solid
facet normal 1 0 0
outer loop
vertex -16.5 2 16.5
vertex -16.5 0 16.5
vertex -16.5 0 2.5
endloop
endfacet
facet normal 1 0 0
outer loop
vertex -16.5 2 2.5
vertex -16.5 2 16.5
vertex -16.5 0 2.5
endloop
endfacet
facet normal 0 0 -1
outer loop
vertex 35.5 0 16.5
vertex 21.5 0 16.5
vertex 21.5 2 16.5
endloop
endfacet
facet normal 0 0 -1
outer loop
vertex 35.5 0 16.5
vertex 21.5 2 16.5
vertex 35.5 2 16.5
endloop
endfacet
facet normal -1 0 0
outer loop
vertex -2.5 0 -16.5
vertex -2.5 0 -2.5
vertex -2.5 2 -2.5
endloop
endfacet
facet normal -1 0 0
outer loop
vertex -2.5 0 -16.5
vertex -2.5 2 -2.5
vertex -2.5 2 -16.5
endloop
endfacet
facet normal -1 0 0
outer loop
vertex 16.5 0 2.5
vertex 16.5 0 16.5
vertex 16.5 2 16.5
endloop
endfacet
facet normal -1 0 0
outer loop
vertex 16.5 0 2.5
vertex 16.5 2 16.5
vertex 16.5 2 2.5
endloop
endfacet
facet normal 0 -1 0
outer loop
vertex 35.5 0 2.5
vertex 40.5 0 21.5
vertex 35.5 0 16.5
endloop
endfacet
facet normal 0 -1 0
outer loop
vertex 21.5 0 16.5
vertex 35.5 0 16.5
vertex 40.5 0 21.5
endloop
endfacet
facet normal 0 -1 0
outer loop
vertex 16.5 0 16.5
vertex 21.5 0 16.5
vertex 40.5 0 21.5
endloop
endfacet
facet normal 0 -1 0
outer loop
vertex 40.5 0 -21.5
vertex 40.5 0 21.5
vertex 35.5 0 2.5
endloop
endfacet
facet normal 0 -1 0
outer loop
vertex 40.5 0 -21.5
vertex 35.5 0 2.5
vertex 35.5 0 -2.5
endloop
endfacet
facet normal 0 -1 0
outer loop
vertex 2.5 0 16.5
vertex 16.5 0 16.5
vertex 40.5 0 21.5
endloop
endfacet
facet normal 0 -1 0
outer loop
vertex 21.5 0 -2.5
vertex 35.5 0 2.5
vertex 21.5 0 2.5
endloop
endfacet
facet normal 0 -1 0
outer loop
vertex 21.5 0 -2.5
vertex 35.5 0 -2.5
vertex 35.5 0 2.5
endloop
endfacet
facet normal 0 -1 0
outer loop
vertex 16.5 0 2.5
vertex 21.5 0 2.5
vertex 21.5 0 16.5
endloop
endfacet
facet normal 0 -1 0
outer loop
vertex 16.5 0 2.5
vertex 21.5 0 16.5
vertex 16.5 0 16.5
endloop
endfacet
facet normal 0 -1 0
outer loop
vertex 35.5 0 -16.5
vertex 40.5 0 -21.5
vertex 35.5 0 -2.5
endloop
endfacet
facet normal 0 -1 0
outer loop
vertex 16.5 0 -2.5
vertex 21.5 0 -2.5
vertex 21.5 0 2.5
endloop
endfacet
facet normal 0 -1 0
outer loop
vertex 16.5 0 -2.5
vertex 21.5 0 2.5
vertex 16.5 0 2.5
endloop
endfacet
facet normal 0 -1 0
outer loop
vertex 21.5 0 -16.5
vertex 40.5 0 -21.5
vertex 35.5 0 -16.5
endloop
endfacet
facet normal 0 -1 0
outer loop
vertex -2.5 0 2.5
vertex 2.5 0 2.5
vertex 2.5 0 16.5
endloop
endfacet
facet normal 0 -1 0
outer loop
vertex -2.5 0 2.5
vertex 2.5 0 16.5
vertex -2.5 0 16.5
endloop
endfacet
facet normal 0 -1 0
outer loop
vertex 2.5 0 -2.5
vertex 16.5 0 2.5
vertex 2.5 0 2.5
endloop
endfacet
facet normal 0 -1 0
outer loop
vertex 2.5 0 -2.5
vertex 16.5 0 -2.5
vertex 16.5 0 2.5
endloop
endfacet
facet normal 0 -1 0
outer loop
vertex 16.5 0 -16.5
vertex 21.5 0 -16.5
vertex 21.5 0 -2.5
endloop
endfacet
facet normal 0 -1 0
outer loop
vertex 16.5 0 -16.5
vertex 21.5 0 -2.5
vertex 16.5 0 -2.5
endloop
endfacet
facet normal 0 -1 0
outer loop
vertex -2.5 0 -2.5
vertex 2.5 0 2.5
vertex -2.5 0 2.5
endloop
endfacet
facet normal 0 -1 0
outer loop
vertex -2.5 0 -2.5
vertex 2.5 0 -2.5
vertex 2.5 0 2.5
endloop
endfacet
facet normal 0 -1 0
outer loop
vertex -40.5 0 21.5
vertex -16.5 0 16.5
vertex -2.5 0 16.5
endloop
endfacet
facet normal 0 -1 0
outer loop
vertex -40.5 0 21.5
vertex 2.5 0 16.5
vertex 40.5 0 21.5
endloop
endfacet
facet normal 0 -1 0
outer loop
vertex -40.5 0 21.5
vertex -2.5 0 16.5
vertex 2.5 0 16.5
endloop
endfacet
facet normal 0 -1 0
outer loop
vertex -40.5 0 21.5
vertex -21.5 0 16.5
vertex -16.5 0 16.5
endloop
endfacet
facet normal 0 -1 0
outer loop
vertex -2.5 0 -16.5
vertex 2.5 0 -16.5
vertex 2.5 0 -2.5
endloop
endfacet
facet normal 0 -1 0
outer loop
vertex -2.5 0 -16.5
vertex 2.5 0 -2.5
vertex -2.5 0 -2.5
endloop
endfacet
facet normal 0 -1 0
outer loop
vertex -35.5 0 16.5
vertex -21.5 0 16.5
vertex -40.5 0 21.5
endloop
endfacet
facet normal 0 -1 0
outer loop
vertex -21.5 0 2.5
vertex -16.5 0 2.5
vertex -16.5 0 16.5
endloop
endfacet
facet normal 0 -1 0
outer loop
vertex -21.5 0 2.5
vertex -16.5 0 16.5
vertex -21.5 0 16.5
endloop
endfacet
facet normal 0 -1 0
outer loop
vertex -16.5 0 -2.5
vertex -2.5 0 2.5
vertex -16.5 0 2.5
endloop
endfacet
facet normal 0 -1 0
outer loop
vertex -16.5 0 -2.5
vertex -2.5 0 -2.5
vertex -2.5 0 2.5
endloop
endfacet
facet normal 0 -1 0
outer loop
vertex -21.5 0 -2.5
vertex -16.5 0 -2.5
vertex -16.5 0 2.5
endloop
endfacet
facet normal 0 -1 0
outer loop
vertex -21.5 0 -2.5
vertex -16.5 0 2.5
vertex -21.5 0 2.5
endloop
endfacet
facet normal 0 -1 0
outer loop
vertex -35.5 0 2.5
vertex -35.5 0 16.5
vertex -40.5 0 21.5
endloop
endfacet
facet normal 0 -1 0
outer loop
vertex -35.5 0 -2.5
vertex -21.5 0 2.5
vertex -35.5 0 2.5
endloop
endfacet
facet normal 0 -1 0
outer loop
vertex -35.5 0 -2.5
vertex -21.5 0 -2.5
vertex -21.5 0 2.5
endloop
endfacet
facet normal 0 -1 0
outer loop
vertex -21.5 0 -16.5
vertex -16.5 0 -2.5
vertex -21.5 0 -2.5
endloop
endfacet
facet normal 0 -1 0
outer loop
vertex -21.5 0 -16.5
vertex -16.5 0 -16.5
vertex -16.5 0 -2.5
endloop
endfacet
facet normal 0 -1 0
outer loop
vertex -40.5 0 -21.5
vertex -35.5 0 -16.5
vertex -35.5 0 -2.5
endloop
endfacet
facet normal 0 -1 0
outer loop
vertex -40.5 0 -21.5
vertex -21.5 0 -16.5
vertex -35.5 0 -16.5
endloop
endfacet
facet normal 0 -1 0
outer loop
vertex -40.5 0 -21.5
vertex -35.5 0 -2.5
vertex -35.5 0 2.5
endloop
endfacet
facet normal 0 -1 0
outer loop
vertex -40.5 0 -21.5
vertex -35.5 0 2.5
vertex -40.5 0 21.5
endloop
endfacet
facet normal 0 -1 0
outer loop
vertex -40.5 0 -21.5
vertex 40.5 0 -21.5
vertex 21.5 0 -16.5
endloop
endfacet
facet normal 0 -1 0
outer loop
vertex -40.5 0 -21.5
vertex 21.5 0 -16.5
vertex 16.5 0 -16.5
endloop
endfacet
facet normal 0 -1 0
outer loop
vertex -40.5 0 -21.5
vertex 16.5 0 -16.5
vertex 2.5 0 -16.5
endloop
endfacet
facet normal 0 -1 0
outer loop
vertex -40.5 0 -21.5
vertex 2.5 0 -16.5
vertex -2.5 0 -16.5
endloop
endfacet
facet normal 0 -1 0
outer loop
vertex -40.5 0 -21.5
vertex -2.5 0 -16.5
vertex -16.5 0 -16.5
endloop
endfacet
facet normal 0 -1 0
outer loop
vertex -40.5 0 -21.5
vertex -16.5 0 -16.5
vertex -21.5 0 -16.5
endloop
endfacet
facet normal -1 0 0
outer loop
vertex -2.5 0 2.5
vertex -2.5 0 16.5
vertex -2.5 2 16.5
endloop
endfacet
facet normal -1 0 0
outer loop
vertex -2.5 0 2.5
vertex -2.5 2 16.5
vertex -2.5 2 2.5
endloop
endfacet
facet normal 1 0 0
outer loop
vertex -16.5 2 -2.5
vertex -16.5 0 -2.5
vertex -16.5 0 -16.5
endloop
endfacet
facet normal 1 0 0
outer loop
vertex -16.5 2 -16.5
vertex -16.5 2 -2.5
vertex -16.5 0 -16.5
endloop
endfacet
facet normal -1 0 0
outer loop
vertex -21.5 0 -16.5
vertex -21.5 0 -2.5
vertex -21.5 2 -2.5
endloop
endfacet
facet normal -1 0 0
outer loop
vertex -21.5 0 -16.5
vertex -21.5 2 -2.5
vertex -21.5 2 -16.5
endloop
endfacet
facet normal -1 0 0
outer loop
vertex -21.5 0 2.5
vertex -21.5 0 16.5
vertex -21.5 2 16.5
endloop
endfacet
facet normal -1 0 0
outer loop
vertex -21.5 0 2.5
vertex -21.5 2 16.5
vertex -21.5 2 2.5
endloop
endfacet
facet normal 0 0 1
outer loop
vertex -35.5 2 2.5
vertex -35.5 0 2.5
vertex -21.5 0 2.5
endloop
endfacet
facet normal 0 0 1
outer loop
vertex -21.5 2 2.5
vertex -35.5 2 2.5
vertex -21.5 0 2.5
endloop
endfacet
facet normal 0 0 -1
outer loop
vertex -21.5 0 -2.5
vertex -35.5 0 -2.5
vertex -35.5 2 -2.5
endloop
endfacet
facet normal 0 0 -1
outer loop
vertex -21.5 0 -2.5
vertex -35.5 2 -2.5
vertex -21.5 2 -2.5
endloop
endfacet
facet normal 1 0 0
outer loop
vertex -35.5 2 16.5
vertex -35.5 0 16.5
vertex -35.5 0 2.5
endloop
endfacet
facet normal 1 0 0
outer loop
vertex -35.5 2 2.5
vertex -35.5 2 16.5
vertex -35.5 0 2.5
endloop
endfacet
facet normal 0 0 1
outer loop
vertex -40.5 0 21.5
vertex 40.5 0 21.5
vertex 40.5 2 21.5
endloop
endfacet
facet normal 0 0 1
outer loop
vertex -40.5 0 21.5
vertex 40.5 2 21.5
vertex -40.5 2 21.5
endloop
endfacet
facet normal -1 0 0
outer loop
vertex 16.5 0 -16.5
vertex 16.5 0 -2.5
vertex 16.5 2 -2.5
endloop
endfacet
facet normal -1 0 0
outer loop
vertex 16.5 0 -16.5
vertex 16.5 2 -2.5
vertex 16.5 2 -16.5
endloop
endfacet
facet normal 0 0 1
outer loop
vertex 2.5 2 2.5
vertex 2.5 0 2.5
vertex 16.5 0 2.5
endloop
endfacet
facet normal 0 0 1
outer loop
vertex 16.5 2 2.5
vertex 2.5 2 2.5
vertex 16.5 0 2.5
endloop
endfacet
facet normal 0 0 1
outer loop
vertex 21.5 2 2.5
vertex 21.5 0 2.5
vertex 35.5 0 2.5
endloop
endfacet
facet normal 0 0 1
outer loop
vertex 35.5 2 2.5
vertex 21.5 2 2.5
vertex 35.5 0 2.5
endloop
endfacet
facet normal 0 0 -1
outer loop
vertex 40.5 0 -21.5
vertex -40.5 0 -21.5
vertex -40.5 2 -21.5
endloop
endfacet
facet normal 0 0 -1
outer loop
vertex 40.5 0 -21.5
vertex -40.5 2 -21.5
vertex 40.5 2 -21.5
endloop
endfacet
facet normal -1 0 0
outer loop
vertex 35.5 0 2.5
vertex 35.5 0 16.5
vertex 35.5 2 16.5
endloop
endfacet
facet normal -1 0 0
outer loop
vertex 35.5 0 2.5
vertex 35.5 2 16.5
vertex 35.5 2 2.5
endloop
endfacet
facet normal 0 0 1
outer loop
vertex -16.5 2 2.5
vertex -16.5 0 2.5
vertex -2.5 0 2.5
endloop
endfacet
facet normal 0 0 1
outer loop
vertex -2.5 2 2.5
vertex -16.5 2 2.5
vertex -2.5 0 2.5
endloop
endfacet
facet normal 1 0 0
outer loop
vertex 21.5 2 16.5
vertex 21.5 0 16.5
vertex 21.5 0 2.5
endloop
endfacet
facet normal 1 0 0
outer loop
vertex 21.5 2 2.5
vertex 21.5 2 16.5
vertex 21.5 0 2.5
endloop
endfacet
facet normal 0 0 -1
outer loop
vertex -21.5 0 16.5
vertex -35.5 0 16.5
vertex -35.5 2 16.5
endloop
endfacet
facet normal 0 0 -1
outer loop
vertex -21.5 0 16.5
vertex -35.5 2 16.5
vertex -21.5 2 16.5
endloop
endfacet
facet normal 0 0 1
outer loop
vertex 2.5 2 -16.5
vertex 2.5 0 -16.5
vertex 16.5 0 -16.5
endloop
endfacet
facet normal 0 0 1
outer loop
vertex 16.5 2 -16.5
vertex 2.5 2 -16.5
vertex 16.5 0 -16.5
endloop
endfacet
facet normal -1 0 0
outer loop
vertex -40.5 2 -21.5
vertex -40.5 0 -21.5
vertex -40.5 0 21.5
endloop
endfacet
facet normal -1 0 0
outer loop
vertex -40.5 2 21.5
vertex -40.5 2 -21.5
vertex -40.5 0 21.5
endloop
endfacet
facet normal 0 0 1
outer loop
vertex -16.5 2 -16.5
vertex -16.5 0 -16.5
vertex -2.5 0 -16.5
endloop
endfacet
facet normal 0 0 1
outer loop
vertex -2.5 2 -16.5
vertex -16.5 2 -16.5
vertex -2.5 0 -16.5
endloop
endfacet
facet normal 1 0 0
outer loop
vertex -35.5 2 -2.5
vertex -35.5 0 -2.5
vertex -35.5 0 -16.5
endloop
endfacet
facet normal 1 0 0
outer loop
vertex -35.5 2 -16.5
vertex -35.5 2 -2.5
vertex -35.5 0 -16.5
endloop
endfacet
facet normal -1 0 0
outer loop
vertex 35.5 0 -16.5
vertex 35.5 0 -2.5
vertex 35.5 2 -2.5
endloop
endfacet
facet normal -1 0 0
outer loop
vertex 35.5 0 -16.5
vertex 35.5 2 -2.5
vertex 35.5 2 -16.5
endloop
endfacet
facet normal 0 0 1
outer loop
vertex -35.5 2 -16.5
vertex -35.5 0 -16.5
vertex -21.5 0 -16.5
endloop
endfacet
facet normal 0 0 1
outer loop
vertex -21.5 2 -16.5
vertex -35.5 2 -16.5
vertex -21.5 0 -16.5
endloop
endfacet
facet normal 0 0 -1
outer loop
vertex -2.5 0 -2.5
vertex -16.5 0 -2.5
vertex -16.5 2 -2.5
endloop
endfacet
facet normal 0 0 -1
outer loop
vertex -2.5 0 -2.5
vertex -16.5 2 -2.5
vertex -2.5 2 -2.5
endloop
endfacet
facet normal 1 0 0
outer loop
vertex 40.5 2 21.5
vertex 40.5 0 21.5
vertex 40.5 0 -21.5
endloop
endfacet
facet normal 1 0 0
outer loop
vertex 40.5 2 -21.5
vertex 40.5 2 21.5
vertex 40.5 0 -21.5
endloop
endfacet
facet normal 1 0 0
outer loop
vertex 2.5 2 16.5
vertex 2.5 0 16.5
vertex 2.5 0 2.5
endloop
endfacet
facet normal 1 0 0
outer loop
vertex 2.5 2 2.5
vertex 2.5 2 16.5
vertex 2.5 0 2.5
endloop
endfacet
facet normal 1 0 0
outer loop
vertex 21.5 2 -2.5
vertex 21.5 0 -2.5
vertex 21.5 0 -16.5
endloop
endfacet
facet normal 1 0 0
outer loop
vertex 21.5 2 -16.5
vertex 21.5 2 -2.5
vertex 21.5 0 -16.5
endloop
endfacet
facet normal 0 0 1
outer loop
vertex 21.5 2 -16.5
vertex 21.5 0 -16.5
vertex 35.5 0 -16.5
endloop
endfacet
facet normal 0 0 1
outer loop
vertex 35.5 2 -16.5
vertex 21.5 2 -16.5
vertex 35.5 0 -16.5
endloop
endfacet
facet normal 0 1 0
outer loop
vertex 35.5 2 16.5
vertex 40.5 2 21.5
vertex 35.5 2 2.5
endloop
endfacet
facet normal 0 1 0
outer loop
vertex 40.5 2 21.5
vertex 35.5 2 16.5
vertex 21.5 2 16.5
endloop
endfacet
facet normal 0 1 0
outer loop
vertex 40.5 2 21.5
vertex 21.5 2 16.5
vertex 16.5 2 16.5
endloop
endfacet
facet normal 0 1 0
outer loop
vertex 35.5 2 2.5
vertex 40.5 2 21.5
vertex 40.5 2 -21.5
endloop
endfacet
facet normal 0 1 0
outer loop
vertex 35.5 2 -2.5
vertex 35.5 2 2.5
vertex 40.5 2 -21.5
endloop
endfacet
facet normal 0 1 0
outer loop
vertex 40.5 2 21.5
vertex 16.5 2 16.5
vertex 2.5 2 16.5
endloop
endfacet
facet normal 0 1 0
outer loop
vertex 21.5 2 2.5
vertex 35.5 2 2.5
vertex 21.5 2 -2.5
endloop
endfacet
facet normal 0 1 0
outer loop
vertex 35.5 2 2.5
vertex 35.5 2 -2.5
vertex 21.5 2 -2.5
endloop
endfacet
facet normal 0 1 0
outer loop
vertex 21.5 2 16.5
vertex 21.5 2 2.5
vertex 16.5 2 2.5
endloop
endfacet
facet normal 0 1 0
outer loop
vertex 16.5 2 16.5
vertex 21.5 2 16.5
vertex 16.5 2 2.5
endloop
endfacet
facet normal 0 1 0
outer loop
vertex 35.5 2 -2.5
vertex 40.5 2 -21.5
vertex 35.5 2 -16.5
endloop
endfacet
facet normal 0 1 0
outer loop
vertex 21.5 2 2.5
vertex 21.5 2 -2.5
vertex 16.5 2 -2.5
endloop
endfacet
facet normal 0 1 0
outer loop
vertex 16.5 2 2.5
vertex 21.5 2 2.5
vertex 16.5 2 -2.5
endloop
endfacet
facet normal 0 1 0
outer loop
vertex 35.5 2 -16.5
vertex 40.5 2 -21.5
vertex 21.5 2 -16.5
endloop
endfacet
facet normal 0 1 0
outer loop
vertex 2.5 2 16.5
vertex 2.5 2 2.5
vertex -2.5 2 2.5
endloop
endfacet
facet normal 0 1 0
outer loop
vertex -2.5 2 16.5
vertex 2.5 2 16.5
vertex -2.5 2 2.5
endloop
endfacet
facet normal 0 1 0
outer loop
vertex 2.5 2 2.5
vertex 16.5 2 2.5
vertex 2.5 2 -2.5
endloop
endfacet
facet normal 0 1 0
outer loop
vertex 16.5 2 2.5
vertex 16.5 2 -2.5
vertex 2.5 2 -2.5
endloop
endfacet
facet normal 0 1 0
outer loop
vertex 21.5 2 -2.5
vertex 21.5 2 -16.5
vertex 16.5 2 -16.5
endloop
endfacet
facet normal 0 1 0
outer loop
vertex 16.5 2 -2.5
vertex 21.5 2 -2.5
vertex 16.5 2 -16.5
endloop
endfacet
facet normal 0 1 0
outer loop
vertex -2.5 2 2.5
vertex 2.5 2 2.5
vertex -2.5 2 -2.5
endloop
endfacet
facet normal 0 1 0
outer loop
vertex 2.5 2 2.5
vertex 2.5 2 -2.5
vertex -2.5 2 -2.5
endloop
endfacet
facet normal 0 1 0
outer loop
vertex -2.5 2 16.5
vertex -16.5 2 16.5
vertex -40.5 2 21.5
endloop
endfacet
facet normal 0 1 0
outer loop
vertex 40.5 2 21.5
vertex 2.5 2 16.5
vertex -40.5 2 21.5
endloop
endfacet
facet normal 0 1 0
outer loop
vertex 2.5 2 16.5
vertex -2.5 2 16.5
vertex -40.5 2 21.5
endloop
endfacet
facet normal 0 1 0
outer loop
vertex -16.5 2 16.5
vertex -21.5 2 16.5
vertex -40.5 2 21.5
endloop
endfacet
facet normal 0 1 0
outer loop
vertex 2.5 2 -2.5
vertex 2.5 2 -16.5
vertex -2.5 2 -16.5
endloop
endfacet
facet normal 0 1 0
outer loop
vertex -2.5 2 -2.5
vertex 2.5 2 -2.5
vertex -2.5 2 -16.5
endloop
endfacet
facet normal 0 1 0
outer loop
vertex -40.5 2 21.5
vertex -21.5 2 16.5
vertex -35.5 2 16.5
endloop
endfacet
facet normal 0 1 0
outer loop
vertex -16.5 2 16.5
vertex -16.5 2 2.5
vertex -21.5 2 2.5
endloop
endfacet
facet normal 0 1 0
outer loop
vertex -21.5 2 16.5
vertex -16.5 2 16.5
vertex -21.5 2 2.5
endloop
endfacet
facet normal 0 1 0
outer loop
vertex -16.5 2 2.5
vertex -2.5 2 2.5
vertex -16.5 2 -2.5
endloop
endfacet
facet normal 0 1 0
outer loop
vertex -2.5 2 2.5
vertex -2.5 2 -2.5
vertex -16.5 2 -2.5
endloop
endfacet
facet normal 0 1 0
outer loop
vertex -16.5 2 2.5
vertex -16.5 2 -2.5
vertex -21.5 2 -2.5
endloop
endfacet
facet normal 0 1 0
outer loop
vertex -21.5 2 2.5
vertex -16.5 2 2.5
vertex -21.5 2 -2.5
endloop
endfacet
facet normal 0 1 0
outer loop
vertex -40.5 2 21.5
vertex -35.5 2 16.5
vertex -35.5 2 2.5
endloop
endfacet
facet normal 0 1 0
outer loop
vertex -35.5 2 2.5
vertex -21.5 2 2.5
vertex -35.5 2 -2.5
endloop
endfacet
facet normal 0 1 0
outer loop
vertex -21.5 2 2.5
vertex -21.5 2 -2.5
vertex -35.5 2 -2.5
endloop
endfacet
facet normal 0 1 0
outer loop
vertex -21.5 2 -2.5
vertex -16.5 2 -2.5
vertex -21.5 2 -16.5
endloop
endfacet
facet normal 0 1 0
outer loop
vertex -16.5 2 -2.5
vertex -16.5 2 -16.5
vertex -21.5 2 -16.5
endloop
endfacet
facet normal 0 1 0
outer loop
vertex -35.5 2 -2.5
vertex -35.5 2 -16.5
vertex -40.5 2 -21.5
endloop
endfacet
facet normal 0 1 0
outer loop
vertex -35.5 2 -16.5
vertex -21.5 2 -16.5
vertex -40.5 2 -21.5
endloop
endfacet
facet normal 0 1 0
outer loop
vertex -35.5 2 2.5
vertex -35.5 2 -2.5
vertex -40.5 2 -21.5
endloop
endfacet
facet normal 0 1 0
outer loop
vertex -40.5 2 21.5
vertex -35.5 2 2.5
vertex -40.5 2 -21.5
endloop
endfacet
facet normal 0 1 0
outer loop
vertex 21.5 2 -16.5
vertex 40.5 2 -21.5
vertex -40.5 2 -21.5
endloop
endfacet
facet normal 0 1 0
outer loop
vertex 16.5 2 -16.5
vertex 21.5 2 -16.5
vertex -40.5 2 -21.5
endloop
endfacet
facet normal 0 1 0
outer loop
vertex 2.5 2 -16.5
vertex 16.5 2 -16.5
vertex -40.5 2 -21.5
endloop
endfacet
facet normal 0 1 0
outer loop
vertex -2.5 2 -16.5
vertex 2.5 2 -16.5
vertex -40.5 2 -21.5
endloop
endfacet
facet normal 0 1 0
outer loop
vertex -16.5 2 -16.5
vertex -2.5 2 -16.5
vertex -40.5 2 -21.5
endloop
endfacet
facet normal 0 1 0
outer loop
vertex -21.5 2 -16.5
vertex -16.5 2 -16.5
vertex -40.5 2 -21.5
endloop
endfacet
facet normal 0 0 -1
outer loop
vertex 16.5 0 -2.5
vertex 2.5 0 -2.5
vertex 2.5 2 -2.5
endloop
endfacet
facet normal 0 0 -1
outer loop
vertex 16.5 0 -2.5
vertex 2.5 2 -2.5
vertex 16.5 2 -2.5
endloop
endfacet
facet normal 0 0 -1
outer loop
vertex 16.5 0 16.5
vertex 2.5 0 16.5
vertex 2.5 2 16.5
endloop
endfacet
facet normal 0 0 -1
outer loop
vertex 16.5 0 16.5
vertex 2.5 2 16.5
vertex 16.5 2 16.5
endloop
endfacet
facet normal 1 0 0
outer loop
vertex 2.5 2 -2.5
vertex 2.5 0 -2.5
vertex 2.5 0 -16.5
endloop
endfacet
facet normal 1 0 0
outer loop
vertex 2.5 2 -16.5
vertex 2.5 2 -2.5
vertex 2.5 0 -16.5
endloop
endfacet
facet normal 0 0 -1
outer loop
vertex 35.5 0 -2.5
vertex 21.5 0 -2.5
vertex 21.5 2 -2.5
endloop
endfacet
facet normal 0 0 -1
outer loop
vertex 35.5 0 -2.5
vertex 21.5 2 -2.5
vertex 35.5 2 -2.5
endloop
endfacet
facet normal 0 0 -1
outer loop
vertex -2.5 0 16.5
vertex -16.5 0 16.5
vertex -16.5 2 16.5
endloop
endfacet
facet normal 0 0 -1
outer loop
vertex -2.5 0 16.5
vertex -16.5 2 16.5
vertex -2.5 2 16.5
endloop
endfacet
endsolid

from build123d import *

# Parameters (mm, degrees)
SKETCH1_W           = 14
SKETCH1_H           = 14
BOSS_EXTRUDE1_DEPTH = 2


with BuildPart() as part:
    # Sketch1 → Boss-Extrude1 (new body)
    with BuildSketch(Plane(origin=(0, 0, 0), x_dir=(1, 0, 0), z_dir=(0, 1, 0))):
        Polygon((-40.5, 21.5), (40.5, 21.5), (40.5, 16.5), (40.5, 0), (40.5, -16.5), (40.5, -21.5), (-40.5, -21.5), (-40.5, -16.5), (-40.5, 16.5), align=None)
        with Locations((28.5, 9.5)):
            Rectangle(SKETCH1_W, SKETCH1_H, mode=Mode.SUBTRACT)
        with Locations((9.5, 9.5)):
            Rectangle(SKETCH1_W, SKETCH1_H, mode=Mode.SUBTRACT)
        with Locations((-28.5, 9.5)):
            Rectangle(SKETCH1_W, SKETCH1_H, mode=Mode.SUBTRACT)
        with Locations((-9.5, 9.5)):
            Rectangle(SKETCH1_W, SKETCH1_H, mode=Mode.SUBTRACT)
        with Locations((-28.5, -9.5)):
            Rectangle(SKETCH1_W, SKETCH1_H, mode=Mode.SUBTRACT)
        with Locations((-9.5, -9.5)):
            Rectangle(SKETCH1_W, SKETCH1_H, mode=Mode.SUBTRACT)
        with Locations((28.5, -9.5)):
            Rectangle(SKETCH1_W, SKETCH1_H, mode=Mode.SUBTRACT)
        with Locations((9.5, -9.5)):
            Rectangle(SKETCH1_W, SKETCH1_H, mode=Mode.SUBTRACT)
    extrude(amount=BOSS_EXTRUDE1_DEPTH)


solid = part.part
